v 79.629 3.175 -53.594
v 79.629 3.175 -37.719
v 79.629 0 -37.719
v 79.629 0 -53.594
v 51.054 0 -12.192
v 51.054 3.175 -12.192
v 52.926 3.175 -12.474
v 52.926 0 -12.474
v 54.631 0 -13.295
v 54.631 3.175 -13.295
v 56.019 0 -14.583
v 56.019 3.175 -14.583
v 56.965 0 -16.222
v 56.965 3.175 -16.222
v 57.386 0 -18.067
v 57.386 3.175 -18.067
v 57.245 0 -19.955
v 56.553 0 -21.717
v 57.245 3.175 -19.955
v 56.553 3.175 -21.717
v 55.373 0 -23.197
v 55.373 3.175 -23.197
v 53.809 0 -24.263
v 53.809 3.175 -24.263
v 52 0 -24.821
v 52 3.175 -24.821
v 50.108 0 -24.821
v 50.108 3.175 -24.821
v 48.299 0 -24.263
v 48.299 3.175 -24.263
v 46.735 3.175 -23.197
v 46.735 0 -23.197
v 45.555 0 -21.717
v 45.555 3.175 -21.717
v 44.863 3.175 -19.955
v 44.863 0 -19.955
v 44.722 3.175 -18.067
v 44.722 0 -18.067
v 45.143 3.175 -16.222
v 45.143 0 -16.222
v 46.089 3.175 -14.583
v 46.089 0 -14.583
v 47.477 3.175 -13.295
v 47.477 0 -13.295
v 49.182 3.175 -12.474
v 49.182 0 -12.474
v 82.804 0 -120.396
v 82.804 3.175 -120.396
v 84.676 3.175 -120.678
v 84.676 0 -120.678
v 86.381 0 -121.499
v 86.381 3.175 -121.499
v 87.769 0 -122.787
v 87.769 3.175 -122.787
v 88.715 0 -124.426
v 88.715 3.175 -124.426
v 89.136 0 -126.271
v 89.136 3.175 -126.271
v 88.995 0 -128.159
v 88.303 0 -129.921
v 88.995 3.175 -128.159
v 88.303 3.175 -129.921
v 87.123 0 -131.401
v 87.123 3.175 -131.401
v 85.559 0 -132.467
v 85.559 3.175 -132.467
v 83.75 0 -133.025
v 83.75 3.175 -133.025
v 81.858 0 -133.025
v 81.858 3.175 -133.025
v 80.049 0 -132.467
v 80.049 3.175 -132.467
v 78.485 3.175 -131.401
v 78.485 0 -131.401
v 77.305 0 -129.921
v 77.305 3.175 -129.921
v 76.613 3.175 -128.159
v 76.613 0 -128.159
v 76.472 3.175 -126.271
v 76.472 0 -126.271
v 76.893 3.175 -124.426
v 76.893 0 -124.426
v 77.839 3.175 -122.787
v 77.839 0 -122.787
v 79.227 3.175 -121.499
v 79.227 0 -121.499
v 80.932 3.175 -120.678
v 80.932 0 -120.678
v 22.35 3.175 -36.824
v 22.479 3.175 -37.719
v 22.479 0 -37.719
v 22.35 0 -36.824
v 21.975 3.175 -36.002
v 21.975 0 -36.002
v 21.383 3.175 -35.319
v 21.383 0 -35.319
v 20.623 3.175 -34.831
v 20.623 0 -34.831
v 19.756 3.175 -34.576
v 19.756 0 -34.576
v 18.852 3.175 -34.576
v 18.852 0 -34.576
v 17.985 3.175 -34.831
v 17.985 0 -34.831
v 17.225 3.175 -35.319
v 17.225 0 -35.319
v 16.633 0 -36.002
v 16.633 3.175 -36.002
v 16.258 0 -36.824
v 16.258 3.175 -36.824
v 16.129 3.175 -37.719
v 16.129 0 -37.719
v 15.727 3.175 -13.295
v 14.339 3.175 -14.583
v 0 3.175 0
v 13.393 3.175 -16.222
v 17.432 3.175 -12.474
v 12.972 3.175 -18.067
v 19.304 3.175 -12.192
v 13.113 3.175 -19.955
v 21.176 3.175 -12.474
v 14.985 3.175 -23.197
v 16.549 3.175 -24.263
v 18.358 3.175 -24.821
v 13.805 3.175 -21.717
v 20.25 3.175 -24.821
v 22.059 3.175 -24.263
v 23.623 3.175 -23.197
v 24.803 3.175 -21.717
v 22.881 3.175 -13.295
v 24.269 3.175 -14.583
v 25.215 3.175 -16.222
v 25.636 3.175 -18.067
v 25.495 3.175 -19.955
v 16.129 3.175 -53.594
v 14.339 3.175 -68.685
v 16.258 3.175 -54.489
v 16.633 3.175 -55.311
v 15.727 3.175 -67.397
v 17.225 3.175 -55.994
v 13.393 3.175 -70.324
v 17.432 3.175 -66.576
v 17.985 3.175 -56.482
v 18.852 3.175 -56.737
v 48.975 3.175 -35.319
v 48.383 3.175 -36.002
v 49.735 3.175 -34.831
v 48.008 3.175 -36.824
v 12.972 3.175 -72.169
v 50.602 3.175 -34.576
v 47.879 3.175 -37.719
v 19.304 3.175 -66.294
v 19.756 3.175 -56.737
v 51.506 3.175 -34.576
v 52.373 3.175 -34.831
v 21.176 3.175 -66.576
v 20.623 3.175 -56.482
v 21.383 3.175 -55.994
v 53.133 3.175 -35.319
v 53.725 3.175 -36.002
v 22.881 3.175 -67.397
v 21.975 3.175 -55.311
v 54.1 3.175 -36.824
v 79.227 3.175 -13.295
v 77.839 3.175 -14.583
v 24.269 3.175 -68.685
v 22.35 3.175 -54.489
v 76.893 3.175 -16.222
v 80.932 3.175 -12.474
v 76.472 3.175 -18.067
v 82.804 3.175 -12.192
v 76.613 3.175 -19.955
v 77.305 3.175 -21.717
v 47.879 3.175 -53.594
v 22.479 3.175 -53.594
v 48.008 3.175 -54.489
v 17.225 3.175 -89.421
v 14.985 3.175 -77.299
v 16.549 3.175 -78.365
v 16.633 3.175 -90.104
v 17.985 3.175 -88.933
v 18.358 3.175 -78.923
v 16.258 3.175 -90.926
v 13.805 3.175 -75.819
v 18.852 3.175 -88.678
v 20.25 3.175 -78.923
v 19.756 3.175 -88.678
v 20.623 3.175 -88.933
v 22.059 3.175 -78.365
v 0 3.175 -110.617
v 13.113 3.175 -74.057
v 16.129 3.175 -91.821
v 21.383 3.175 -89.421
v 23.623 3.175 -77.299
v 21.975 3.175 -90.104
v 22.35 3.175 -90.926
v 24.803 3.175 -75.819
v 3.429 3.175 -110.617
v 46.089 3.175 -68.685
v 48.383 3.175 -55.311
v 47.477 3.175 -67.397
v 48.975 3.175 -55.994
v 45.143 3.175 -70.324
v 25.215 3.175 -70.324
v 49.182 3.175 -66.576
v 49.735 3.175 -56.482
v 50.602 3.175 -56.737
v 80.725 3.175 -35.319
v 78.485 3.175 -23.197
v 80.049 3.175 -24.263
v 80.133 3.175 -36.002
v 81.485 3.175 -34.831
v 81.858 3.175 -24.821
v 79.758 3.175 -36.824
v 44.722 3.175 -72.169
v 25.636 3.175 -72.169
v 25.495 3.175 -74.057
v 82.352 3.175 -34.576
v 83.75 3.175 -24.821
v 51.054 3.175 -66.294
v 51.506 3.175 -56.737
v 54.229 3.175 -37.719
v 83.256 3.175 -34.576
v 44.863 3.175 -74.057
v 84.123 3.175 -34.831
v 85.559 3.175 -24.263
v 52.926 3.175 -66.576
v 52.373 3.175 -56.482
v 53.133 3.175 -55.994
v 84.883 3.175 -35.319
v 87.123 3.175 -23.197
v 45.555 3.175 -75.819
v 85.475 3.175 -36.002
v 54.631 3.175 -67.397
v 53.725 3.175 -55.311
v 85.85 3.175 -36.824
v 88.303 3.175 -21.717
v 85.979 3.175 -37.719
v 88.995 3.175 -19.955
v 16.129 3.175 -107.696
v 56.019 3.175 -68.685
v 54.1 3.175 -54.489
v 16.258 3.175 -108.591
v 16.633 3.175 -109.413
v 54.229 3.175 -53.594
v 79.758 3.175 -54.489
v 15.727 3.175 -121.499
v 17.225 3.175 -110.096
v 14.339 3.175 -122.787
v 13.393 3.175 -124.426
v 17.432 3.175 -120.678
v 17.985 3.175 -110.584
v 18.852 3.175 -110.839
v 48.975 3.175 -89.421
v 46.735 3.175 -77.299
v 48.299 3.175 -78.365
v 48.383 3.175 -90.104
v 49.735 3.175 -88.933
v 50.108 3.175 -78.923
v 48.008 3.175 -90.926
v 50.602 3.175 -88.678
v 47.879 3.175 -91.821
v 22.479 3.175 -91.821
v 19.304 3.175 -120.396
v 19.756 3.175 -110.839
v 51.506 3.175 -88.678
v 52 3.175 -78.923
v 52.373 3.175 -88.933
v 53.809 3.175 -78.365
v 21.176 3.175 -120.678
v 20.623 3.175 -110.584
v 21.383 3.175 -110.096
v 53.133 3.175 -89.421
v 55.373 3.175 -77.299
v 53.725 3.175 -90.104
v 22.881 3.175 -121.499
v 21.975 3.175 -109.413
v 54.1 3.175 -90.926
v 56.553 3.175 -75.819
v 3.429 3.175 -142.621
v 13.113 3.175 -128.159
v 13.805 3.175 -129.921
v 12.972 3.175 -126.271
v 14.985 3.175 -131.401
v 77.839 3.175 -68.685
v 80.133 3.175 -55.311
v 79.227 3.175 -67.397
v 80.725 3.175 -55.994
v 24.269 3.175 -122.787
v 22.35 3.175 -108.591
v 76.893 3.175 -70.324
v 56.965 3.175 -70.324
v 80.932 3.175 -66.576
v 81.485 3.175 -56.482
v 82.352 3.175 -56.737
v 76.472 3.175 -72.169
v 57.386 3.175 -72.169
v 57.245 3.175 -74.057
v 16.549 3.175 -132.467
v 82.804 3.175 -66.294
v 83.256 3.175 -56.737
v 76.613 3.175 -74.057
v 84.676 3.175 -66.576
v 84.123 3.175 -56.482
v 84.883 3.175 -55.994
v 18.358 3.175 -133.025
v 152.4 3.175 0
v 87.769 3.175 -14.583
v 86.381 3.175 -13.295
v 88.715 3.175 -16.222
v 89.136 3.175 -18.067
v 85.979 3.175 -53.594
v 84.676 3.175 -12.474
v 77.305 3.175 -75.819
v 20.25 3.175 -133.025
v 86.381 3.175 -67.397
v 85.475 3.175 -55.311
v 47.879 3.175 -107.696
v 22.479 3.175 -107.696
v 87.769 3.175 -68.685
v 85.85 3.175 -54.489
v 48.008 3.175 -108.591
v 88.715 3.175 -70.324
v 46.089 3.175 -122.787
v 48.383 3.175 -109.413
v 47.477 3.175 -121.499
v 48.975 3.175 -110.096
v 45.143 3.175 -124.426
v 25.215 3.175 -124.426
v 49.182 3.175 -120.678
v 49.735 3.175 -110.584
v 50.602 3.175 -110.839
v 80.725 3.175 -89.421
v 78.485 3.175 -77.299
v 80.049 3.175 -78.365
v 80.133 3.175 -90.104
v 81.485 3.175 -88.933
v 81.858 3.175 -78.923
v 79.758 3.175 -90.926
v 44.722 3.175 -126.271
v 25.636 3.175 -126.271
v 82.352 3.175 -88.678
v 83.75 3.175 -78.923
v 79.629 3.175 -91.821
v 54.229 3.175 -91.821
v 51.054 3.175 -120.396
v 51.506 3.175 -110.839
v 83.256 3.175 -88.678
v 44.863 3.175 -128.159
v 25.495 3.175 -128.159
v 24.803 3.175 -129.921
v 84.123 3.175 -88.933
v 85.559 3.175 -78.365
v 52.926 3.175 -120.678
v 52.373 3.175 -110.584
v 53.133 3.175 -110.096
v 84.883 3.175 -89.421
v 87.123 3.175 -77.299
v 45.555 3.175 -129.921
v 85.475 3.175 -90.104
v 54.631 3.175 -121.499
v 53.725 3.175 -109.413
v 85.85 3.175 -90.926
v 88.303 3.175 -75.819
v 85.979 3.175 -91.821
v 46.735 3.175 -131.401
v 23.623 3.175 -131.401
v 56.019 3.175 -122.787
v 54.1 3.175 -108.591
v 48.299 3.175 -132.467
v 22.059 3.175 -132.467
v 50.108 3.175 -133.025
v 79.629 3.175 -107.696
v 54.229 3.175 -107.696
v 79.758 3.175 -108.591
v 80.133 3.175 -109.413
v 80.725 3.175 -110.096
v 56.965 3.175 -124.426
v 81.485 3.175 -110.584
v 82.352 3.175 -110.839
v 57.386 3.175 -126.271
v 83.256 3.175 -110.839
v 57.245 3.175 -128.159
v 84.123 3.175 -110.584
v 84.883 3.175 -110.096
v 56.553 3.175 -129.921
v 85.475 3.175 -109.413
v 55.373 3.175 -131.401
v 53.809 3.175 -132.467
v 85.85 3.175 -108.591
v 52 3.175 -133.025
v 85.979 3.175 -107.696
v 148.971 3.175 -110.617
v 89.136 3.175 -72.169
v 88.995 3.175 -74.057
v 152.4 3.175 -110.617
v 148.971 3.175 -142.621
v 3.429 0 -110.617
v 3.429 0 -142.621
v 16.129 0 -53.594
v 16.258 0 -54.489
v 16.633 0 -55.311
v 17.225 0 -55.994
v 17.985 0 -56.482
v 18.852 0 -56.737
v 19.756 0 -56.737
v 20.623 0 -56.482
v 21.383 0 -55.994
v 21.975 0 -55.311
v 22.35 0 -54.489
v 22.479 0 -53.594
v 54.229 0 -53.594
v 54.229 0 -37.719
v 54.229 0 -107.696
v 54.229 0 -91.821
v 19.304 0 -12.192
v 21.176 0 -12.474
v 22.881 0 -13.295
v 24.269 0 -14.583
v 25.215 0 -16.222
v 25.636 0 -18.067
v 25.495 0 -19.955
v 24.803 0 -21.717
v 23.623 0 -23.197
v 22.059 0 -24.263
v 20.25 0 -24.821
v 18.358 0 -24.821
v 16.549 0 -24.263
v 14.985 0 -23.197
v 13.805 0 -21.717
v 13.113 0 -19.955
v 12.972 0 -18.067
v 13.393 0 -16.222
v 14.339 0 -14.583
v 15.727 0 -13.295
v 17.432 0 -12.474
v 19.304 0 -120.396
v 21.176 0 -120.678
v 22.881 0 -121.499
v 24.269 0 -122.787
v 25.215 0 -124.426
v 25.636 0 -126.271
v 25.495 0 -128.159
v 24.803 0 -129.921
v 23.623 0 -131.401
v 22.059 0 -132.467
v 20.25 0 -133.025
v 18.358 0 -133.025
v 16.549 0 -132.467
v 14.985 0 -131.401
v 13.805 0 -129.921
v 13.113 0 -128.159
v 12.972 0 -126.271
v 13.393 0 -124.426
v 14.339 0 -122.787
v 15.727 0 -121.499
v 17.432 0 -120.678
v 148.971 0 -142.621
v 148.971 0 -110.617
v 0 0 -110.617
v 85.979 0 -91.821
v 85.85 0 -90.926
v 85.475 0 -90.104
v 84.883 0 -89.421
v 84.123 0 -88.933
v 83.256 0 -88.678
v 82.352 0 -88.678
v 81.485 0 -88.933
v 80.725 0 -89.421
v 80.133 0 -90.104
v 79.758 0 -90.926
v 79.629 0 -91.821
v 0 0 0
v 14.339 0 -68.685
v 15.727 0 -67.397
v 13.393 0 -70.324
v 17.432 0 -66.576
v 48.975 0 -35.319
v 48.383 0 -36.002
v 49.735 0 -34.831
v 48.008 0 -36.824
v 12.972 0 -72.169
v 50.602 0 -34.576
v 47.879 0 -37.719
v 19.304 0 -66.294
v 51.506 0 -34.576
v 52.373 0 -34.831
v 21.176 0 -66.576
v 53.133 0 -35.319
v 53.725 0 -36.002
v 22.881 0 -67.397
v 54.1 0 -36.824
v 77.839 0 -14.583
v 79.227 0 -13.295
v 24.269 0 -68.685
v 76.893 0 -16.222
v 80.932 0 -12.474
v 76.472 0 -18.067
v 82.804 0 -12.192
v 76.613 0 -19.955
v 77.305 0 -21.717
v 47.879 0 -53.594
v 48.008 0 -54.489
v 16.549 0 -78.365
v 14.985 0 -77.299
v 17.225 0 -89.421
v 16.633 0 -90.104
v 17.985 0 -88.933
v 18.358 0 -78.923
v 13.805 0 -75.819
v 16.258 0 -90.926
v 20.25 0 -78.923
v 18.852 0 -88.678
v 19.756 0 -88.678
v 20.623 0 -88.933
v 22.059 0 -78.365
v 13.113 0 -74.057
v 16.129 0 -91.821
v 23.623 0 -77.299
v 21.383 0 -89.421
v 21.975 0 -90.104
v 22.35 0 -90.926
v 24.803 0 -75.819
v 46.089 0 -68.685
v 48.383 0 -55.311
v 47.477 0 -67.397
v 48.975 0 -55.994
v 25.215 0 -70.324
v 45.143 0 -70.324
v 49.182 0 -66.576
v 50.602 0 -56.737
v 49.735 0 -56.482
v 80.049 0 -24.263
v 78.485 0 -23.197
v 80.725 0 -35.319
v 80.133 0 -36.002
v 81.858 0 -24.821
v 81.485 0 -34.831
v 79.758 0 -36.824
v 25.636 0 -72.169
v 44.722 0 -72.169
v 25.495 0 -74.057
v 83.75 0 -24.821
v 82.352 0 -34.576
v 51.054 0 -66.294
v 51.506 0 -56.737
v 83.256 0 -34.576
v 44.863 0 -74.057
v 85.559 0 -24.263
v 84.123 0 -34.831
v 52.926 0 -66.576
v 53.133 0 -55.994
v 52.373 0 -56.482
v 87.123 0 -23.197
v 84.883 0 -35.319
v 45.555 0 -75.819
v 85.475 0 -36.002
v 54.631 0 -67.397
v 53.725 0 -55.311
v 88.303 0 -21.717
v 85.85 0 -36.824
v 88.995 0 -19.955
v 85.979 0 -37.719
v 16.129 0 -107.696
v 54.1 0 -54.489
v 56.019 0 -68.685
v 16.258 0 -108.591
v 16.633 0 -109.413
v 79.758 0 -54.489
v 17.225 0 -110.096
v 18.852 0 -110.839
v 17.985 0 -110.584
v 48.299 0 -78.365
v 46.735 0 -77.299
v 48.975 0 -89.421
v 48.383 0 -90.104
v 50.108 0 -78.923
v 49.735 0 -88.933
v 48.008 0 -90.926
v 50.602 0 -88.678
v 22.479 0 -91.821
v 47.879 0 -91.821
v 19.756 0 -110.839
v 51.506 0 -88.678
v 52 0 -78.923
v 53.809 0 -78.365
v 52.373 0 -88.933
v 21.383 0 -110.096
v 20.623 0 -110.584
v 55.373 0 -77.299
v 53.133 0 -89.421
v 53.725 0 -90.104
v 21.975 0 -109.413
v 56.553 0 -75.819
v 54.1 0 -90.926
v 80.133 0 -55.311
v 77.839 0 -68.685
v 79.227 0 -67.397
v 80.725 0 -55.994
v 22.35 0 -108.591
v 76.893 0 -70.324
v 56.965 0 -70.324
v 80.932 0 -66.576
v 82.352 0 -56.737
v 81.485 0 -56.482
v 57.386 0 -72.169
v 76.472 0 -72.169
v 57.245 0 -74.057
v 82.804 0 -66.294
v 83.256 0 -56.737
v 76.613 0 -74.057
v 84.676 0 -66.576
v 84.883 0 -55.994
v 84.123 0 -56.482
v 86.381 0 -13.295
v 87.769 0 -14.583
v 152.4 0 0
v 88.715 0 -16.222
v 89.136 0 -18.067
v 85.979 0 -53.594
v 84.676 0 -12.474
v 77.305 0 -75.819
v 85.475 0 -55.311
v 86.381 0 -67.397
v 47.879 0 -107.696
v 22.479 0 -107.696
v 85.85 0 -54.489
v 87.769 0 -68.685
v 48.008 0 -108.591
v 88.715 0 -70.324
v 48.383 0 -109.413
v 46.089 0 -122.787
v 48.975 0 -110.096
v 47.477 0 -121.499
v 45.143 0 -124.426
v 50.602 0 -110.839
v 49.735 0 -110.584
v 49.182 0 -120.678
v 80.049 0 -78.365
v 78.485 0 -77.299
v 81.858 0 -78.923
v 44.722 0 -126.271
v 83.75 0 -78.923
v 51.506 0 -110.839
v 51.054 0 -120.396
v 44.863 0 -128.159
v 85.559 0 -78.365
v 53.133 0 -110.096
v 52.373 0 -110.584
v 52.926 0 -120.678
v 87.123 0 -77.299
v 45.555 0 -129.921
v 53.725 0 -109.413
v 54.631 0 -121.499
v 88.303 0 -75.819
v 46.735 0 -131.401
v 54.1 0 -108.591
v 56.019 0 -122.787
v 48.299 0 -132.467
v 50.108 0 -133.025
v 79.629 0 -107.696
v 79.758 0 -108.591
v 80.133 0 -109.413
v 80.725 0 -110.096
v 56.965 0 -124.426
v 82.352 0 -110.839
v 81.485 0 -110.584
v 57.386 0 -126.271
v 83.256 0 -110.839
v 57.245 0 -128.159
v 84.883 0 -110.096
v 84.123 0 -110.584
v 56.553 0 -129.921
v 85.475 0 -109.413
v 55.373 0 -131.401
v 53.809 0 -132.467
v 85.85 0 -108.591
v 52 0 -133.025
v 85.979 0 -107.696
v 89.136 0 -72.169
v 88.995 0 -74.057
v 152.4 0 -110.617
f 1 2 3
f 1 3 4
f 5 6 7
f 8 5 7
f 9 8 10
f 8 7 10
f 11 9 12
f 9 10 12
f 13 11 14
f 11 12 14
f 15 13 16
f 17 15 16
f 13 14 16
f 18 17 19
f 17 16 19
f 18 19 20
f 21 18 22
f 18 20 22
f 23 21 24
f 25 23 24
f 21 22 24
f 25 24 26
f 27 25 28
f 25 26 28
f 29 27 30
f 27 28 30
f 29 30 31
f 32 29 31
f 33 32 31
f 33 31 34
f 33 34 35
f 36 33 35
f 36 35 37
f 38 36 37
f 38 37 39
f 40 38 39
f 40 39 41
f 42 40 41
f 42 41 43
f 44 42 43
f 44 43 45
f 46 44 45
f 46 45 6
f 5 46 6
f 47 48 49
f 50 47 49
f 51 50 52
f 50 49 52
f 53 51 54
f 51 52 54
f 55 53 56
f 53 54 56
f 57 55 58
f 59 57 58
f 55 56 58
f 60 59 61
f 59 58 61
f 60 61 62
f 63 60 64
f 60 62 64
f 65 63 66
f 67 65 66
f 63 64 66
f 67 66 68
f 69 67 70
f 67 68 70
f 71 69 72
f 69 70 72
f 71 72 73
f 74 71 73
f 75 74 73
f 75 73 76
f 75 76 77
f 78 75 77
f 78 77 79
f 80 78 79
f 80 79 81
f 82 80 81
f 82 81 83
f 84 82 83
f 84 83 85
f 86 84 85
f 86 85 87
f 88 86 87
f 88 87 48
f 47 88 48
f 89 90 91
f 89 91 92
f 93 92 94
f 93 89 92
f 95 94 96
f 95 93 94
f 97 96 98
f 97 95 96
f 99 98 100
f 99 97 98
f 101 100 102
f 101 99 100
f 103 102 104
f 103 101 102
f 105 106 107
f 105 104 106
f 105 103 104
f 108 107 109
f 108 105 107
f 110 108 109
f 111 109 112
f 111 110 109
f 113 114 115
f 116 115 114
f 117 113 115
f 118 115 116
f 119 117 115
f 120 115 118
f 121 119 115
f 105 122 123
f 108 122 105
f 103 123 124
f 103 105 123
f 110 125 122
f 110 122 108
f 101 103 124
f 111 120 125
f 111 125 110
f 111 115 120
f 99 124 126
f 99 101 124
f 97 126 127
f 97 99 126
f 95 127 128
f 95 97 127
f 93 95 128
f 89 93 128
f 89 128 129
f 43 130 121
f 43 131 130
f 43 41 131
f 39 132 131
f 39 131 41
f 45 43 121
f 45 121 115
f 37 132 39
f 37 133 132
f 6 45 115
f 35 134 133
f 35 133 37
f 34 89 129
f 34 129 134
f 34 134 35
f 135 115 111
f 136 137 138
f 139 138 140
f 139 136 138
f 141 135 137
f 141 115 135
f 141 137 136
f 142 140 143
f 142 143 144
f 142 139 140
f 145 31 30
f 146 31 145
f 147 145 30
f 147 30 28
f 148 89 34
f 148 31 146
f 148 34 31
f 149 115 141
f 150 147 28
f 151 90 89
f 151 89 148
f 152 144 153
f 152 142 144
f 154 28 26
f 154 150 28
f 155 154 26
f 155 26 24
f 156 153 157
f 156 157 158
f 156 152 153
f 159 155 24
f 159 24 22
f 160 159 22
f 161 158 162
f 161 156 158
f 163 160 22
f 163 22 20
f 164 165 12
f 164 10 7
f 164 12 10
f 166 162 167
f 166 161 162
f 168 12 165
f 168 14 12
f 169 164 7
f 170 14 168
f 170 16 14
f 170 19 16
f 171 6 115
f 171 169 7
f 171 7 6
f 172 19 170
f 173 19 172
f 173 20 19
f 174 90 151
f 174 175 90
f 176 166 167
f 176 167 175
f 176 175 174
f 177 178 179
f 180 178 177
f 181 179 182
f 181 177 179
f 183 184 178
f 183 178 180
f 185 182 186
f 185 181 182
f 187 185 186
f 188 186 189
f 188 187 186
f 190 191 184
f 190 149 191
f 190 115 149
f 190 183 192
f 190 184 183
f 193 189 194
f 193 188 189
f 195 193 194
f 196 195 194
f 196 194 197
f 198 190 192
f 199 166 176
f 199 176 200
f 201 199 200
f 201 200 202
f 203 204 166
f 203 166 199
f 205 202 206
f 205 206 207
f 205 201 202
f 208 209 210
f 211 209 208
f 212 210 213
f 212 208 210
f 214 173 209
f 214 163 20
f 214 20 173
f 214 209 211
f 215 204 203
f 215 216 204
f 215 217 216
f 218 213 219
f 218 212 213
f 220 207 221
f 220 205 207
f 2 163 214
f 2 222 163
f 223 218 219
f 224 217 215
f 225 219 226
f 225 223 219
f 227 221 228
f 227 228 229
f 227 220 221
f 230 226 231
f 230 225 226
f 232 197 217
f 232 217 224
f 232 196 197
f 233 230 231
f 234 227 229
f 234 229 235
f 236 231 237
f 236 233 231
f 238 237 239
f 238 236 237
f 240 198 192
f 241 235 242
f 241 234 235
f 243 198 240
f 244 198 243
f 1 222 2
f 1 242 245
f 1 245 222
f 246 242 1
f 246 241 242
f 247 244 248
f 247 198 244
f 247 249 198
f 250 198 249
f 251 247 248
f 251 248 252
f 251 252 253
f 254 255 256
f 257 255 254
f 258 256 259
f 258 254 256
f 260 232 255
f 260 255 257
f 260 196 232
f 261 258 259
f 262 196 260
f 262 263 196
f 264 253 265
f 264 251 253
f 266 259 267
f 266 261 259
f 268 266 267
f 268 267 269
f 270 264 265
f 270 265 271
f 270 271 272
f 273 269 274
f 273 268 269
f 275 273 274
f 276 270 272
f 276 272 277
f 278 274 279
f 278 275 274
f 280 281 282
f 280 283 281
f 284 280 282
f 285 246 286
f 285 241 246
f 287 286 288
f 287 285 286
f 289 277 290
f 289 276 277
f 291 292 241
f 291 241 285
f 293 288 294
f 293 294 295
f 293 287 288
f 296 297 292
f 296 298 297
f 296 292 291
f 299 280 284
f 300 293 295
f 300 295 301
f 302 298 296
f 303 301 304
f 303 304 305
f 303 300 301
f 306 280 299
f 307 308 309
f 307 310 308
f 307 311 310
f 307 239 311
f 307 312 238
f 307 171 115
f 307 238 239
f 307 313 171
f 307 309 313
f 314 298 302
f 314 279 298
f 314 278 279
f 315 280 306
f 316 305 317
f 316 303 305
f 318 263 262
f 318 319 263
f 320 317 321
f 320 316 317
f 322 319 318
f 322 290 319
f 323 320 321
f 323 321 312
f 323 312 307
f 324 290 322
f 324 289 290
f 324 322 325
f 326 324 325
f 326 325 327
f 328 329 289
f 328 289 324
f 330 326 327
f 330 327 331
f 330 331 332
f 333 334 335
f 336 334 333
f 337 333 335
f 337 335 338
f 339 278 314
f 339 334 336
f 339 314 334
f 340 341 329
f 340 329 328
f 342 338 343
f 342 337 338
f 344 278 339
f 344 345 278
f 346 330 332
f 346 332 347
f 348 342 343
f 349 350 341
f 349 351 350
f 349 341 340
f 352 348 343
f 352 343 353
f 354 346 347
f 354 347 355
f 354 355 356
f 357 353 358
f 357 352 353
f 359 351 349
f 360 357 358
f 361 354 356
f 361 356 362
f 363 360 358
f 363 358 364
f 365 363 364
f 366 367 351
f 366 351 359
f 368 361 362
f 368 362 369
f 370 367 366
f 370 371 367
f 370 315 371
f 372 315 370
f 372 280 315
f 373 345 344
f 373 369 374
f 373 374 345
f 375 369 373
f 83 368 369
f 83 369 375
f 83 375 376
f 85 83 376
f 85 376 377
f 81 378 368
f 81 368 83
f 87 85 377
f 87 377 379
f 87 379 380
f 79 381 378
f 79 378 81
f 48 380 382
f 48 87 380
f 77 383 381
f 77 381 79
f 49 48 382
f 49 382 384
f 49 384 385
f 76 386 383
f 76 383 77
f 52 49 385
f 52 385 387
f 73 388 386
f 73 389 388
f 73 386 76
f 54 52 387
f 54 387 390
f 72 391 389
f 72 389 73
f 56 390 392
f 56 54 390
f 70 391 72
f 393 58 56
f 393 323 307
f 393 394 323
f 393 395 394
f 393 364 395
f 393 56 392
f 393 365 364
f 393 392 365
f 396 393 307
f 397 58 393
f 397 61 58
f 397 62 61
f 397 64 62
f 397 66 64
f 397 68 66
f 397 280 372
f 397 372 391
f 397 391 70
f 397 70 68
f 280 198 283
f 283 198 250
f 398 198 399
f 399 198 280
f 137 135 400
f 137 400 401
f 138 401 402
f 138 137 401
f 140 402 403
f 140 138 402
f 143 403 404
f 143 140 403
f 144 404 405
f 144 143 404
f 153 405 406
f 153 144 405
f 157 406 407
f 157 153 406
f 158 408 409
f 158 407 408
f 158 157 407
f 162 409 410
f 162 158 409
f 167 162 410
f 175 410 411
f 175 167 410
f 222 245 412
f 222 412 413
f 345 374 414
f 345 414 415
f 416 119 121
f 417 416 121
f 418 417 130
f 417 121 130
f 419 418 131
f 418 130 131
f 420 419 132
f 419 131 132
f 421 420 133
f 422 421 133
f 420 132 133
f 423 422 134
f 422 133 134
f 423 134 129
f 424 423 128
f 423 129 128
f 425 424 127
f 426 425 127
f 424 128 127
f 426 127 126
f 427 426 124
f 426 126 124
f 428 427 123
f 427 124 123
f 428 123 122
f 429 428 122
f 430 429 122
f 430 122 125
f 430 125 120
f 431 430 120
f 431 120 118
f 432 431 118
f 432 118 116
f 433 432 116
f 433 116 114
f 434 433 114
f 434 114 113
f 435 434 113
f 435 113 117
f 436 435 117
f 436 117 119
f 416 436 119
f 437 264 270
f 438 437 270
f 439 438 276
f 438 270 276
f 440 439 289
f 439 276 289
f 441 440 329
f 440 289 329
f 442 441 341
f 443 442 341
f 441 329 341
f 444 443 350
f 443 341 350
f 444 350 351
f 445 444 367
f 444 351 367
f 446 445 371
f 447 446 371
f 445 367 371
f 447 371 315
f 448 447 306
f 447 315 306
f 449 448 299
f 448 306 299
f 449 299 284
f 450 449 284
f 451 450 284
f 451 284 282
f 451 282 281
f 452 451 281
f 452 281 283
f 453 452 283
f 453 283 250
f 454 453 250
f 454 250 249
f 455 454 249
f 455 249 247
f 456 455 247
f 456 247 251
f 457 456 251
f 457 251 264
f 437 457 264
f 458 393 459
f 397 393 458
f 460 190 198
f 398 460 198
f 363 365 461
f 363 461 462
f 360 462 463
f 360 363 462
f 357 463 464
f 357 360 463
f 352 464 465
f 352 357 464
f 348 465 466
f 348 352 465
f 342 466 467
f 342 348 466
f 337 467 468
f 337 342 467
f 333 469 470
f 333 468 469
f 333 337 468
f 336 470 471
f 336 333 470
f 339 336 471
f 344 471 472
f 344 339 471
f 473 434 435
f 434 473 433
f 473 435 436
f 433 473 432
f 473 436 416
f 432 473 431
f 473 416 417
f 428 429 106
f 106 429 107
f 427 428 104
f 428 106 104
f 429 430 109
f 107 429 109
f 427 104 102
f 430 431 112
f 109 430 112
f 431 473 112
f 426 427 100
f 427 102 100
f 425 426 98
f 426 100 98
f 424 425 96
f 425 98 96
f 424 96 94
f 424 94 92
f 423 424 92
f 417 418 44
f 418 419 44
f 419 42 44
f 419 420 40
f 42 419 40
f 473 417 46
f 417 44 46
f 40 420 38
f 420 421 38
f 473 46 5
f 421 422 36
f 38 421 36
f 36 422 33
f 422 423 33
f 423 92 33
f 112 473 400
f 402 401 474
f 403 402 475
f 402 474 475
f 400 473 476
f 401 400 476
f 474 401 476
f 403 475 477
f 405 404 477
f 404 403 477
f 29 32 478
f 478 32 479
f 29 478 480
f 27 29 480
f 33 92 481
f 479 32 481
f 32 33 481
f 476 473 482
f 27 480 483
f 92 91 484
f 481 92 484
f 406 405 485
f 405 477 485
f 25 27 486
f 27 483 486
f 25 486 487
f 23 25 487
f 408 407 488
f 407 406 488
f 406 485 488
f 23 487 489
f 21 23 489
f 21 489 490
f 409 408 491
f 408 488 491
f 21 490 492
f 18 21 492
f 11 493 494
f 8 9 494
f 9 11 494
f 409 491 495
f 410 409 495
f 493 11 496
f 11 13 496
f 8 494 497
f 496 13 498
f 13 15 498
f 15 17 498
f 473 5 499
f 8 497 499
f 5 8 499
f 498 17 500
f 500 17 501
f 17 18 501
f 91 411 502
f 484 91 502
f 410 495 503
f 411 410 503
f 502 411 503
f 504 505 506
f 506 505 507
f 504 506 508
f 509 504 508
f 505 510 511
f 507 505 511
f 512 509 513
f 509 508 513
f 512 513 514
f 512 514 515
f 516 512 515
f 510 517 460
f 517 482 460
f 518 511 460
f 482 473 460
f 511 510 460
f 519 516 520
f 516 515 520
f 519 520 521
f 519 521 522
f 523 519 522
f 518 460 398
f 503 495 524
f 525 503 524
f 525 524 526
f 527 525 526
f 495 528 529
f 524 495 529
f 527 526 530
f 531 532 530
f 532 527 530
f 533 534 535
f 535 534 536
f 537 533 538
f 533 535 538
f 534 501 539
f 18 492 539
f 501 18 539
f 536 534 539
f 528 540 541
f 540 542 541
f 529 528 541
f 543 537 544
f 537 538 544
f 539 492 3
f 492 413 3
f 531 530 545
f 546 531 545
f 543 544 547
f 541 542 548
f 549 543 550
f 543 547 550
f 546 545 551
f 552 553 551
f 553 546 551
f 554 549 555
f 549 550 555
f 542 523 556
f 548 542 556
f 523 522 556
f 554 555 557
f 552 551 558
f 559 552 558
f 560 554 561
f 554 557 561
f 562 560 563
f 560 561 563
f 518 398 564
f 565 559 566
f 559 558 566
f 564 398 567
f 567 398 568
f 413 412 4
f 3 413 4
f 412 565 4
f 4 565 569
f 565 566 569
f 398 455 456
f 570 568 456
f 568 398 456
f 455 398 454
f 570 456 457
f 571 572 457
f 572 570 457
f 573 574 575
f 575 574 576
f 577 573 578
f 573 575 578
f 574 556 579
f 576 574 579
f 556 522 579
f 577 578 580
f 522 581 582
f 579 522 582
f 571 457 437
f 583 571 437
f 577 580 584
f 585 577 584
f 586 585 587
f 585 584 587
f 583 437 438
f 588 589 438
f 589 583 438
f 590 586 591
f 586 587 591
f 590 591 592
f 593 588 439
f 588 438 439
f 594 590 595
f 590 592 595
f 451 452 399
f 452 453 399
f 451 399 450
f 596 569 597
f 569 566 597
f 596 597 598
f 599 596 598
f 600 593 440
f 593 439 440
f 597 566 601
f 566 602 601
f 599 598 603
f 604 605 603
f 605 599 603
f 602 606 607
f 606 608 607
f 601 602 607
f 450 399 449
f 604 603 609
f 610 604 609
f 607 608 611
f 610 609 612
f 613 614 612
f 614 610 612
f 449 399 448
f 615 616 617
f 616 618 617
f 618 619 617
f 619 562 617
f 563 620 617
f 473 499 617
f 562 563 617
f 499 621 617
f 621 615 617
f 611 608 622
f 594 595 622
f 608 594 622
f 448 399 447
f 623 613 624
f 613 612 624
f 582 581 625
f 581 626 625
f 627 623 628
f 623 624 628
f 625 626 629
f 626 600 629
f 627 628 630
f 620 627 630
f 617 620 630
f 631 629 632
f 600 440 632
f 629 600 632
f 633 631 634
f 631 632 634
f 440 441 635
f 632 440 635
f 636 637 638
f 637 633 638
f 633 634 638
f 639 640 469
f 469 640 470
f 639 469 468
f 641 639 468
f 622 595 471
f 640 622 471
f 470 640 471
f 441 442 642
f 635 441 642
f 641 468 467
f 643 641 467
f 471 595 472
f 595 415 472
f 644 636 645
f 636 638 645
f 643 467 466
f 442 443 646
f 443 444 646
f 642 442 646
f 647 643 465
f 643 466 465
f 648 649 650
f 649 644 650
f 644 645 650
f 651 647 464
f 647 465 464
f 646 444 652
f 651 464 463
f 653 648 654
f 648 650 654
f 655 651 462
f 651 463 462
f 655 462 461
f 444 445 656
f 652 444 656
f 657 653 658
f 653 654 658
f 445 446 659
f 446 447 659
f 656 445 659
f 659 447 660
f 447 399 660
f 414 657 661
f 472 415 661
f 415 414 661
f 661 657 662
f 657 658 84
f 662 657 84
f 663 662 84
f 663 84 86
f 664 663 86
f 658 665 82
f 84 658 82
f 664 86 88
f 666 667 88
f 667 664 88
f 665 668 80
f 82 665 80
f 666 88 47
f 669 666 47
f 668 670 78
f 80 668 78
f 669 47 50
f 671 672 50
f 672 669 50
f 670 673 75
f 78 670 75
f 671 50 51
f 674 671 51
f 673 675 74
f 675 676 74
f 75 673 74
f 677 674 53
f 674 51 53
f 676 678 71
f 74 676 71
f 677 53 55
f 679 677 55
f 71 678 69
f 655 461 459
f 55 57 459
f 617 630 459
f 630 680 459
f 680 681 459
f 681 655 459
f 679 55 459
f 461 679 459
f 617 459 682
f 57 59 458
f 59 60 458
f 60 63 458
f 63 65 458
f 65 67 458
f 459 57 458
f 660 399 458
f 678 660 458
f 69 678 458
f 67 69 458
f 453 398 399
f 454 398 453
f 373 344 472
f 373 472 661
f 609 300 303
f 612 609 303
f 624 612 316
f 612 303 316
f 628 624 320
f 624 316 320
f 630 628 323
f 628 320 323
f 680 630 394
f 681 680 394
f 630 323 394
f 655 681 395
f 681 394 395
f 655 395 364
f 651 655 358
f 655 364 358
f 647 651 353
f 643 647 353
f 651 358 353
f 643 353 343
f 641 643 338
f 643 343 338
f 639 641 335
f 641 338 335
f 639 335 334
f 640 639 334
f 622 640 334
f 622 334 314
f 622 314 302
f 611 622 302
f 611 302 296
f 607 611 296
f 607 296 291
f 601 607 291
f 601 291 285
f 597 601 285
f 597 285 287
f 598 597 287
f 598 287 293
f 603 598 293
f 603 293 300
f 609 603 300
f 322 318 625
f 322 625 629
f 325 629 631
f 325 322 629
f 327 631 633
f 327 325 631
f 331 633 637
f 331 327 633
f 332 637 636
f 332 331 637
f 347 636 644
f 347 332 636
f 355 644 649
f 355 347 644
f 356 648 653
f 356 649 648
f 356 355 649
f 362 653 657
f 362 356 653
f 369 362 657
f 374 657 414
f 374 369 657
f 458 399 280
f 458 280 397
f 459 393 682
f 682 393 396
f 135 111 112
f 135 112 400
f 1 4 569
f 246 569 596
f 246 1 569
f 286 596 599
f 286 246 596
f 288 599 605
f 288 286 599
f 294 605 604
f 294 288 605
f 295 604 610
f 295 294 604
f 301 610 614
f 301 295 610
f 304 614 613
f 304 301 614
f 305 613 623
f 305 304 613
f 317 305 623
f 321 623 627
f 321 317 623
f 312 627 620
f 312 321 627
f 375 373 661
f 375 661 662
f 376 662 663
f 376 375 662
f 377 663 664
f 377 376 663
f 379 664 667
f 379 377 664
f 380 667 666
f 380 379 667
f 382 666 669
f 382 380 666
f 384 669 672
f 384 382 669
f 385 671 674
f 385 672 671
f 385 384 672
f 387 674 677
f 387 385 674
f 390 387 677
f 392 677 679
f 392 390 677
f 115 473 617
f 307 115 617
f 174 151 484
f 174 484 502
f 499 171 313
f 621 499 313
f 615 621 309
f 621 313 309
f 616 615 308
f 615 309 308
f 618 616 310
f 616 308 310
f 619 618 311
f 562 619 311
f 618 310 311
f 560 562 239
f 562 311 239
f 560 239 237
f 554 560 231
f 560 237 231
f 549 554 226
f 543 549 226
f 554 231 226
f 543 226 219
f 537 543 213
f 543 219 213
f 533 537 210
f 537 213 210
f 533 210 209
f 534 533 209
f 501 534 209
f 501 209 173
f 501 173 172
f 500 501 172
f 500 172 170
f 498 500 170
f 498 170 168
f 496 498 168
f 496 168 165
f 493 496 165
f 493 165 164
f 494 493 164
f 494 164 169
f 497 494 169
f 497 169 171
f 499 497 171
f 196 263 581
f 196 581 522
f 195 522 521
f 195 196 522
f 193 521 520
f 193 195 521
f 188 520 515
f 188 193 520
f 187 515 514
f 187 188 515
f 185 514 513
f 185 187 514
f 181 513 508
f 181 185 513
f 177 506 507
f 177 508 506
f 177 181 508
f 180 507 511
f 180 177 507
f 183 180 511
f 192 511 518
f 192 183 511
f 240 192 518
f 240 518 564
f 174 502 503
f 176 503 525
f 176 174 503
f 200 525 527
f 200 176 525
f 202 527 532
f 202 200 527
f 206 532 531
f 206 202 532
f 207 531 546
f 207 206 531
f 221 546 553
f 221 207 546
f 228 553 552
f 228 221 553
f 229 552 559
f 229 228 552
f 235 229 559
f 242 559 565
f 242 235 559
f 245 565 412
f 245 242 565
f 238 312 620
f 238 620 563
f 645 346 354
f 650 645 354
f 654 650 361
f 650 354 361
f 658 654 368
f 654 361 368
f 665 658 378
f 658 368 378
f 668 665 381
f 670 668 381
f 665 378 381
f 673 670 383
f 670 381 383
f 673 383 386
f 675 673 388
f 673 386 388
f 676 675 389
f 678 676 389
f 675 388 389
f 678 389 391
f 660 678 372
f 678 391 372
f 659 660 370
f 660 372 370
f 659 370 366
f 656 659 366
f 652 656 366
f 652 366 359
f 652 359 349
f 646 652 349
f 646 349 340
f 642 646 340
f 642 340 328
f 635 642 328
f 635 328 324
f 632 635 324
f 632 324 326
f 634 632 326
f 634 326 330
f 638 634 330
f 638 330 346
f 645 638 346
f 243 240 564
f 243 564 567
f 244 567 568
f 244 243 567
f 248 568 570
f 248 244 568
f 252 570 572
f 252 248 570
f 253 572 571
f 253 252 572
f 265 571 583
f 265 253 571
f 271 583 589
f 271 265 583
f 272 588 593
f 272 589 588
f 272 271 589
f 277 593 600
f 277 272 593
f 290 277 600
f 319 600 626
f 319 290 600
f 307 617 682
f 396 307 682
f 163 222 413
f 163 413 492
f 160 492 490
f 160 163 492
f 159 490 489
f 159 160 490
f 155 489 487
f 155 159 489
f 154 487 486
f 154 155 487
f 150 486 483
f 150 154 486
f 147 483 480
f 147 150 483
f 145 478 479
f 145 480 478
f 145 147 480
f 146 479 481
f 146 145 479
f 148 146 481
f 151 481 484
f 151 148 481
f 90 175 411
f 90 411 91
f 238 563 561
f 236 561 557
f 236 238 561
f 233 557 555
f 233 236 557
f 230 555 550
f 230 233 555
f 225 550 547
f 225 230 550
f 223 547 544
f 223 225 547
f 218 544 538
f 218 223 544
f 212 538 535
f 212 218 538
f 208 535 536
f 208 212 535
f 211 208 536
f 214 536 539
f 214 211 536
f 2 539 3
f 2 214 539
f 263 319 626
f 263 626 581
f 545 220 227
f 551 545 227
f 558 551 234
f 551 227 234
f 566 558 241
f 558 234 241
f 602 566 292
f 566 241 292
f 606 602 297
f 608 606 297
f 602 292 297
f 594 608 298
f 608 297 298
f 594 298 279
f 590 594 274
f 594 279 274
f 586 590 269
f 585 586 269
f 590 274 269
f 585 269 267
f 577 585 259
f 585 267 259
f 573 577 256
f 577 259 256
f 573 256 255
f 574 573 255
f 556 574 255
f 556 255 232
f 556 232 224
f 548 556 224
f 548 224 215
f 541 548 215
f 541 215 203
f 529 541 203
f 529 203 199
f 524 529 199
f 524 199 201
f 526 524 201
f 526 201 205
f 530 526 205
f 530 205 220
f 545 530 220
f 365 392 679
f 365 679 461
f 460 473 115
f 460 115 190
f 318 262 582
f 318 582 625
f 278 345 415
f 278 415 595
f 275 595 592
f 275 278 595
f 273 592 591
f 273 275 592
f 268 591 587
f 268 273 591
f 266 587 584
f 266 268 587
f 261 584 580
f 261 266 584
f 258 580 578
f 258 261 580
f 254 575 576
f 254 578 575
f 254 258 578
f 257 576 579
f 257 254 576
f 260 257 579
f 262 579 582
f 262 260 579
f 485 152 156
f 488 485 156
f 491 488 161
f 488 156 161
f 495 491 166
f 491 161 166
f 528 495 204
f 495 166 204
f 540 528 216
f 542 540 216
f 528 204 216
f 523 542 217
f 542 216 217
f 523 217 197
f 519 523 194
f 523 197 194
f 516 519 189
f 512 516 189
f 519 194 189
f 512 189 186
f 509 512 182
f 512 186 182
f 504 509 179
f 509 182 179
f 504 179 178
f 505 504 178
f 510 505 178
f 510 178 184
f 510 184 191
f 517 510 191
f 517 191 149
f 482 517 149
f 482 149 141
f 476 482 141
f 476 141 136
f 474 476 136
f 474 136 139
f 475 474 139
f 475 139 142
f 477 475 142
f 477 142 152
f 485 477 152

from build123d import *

# Parameters (mm, degrees)
SKETCH1_W           = 152.4
SKETCH1_H           = 142.621
BOSS_EXTRUDE1_DEPTH = 3.175
SKETCH2_W           = 3.429
SKETCH2_H           = 32.004
CUT_EXTRUDE1_DEPTH  = 209.750066505
CUT_EXTRUDE2_REACH  = 210.75
SKETCH3_R           = 6.35


with BuildPart() as part:
    # Sketch1 → Boss-Extrude1 (new body)
    with BuildSketch(Plane(origin=(0, 0, 0), x_dir=(1, 0, 0), z_dir=(0, 1, 0))):
        with Locations((76.2, 71.3105)):
            Rectangle(SKETCH1_W, SKETCH1_H)
    extrude(amount=BOSS_EXTRUDE1_DEPTH)

    # Sketch2 → Cut-Extrude1 (cut, through all)
    with BuildSketch(Plane(origin=(0, 3.175, 0), x_dir=(1, 0, 0), z_dir=(0, 1, 0))):
        with Locations((1.7145, 126.619)):
            Rectangle(SKETCH2_W, SKETCH2_H)
        with Locations((150.6855, 126.619)):
            Rectangle(SKETCH2_W, SKETCH2_H)
    extrude(amount=-CUT_EXTRUDE1_DEPTH, mode=Mode.SUBTRACT)

    # Sketch3 → Cut-Extrude2 (cut, up to next)
    with BuildSketch(Plane(origin=(0, 3.175, 0), x_dir=(1, 0, 0), z_dir=(0, 1, 0)), mode=Mode.PRIVATE) as cut_extrude2_sk1:
        with Locations(Location((19.304, 126.746, 0), (0, 0, 270))):
            Circle(SKETCH3_R)
    cut_extrude2_tool1 = extrude(cut_extrude2_sk1.sketch, amount=-CUT_EXTRUDE2_REACH, mode=Mode.PRIVATE) & part.part
    # Sketch3 → Cut-Extrude2 (cut, up to next)
    with BuildSketch(Plane(origin=(0, 3.175, 0), x_dir=(1, 0, 0), z_dir=(0, 1, 0)), mode=Mode.PRIVATE) as cut_extrude2_sk2:
        with Locations(Location((51.054, 126.746, 0), (0, 0, 270))):
            Circle(SKETCH3_R)
    cut_extrude2_tool2 = extrude(cut_extrude2_sk2.sketch, amount=-CUT_EXTRUDE2_REACH, mode=Mode.PRIVATE) & part.part
    # Sketch3 → Cut-Extrude2 (cut, up to next)
    with BuildSketch(Plane(origin=(0, 3.175, 0), x_dir=(1, 0, 0), z_dir=(0, 1, 0)), mode=Mode.PRIVATE) as cut_extrude2_sk3:
        with Locations(Location((82.804, 126.746, 0), (0, 0, 270))):
            Circle(SKETCH3_R)
    cut_extrude2_tool3 = extrude(cut_extrude2_sk3.sketch, amount=-CUT_EXTRUDE2_REACH, mode=Mode.PRIVATE) & part.part
    # Sketch3 → Cut-Extrude2 (cut, up to next)
    with BuildSketch(Plane(origin=(0, 3.175, 0), x_dir=(1, 0, 0), z_dir=(0, 1, 0)), mode=Mode.PRIVATE) as cut_extrude2_sk4:
        with Locations(Location((19.304, 72.644, 0), (0, 0, 270))):
            Circle(SKETCH3_R)
    cut_extrude2_tool4 = extrude(cut_extrude2_sk4.sketch, amount=-CUT_EXTRUDE2_REACH, mode=Mode.PRIVATE) & part.part
    # Sketch3 → Cut-Extrude2 (cut, up to next)
    with BuildSketch(Plane(origin=(0, 3.175, 0), x_dir=(1, 0, 0), z_dir=(0, 1, 0)), mode=Mode.PRIVATE) as cut_extrude2_sk5:
        with Locations(Location((51.054, 72.644, 0), (0, 0, 270))):
            Circle(SKETCH3_R)
    cut_extrude2_tool5 = extrude(cut_extrude2_sk5.sketch, amount=-CUT_EXTRUDE2_REACH, mode=Mode.PRIVATE) & part.part
    # Sketch3 → Cut-Extrude2 (cut, up to next)
    with BuildSketch(Plane(origin=(0, 3.175, 0), x_dir=(1, 0, 0), z_dir=(0, 1, 0)), mode=Mode.PRIVATE) as cut_extrude2_sk6:
        with Locations(Location((82.804, 72.644, 0), (0, 0, 270))):
            Circle(SKETCH3_R)
    cut_extrude2_tool6 = extrude(cut_extrude2_sk6.sketch, amount=-CUT_EXTRUDE2_REACH, mode=Mode.PRIVATE) & part.part
    # Sketch3 → Cut-Extrude2 (cut, up to next)
    with BuildSketch(Plane(origin=(0, 3.175, 0), x_dir=(1, 0, 0), z_dir=(0, 1, 0)), mode=Mode.PRIVATE) as cut_extrude2_sk7:
        with Locations(Location((19.304, 18.542, 0), (0, 0, 270))):
            Circle(SKETCH3_R)
    cut_extrude2_tool7 = extrude(cut_extrude2_sk7.sketch, amount=-CUT_EXTRUDE2_REACH, mode=Mode.PRIVATE) & part.part
    # Sketch3 → Cut-Extrude2 (cut, up to next)
    with BuildSketch(Plane(origin=(0, 3.175, 0), x_dir=(1, 0, 0), z_dir=(0, 1, 0)), mode=Mode.PRIVATE) as cut_extrude2_sk8:
        with Locations(Location((51.054, 18.542, 0), (0, 0, 270))):
            Circle(SKETCH3_R)
    cut_extrude2_tool8 = extrude(cut_extrude2_sk8.sketch, amount=-CUT_EXTRUDE2_REACH, mode=Mode.PRIVATE) & part.part
    # Sketch3 → Cut-Extrude2 (cut, up to next)
    with BuildSketch(Plane(origin=(0, 3.175, 0), x_dir=(1, 0, 0), z_dir=(0, 1, 0)), mode=Mode.PRIVATE) as cut_extrude2_sk9:
        with Locations(Location((82.804, 18.542, 0), (0, 0, 270))):
            Circle(SKETCH3_R)
    cut_extrude2_tool9 = extrude(cut_extrude2_sk9.sketch, amount=-CUT_EXTRUDE2_REACH, mode=Mode.PRIVATE) & part.part
    # Sketch3 → Cut-Extrude2 (cut, up to next)
    with BuildSketch(Plane(origin=(0, 3.175, 0), x_dir=(1, 0, 0), z_dir=(0, 1, 0)), mode=Mode.PRIVATE) as cut_extrude2_sk10:
        with BuildLine():
            Line((22.479, 107.696), (22.479, 91.821))
            ThreePointArc((22.479, 91.821), (19.304, 88.646), (16.129, 91.821))
            Line((16.129, 91.821), (16.129, 107.696))
            ThreePointArc((16.129, 107.696), (19.304, 110.871), (22.479, 107.696))
        make_face()
    cut_extrude2_tool10 = extrude(cut_extrude2_sk10.sketch, amount=-CUT_EXTRUDE2_REACH, mode=Mode.PRIVATE) & part.part
    # Sketch3 → Cut-Extrude2 (cut, up to next)
    with BuildSketch(Plane(origin=(0, 3.175, 0), x_dir=(1, 0, 0), z_dir=(0, 1, 0)), mode=Mode.PRIVATE) as cut_extrude2_sk11:
        with BuildLine():
            Line((54.229, 107.696), (54.229, 91.821))
            ThreePointArc((54.229, 91.821), (51.054, 88.646), (47.879, 91.821))
            Line((47.879, 91.821), (47.879, 107.696))
            ThreePointArc((47.879, 107.696), (51.054, 110.871), (54.229, 107.696))
        make_face()
    cut_extrude2_tool11 = extrude(cut_extrude2_sk11.sketch, amount=-CUT_EXTRUDE2_REACH, mode=Mode.PRIVATE) & part.part
    # Sketch3 → Cut-Extrude2 (cut, up to next)
    with BuildSketch(Plane(origin=(0, 3.175, 0), x_dir=(1, 0, 0), z_dir=(0, 1, 0)), mode=Mode.PRIVATE) as cut_extrude2_sk12:
        with BuildLine():
            Line((85.979, 107.696), (85.979, 91.821))
            ThreePointArc((85.979, 91.821), (82.804, 88.646), (79.629, 91.821))
            Line((79.629, 91.821), (79.629, 107.696))
            ThreePointArc((79.629, 107.696), (82.804, 110.871), (85.979, 107.696))
        make_face()
    cut_extrude2_tool12 = extrude(cut_extrude2_sk12.sketch, amount=-CUT_EXTRUDE2_REACH, mode=Mode.PRIVATE) & part.part
    # Sketch3 → Cut-Extrude2 (cut, up to next)
    with BuildSketch(Plane(origin=(0, 3.175, 0), x_dir=(1, 0, 0), z_dir=(0, 1, 0)), mode=Mode.PRIVATE) as cut_extrude2_sk13:
        with BuildLine():
            Line((22.479, 53.594), (22.479, 37.719))
            ThreePointArc((22.479, 37.719), (19.304, 34.544), (16.129, 37.719))
            Line((16.129, 37.719), (16.129, 53.594))
            ThreePointArc((16.129, 53.594), (19.304, 56.769), (22.479, 53.594))
        make_face()
    cut_extrude2_tool13 = extrude(cut_extrude2_sk13.sketch, amount=-CUT_EXTRUDE2_REACH, mode=Mode.PRIVATE) & part.part
    # Sketch3 → Cut-Extrude2 (cut, up to next)
    with BuildSketch(Plane(origin=(0, 3.175, 0), x_dir=(1, 0, 0), z_dir=(0, 1, 0)), mode=Mode.PRIVATE) as cut_extrude2_sk14:
        with BuildLine():
            Line((54.229, 53.594), (54.229, 37.719))
            ThreePointArc((54.229, 37.719), (51.054, 34.544), (47.879, 37.719))
            Line((47.879, 37.719), (47.879, 53.594))
            ThreePointArc((47.879, 53.594), (51.054, 56.769), (54.229, 53.594))
        make_face()
    cut_extrude2_tool14 = extrude(cut_extrude2_sk14.sketch, amount=-CUT_EXTRUDE2_REACH, mode=Mode.PRIVATE) & part.part
    # Sketch3 → Cut-Extrude2 (cut, up to next)
    with BuildSketch(Plane(origin=(0, 3.175, 0), x_dir=(1, 0, 0), z_dir=(0, 1, 0)), mode=Mode.PRIVATE) as cut_extrude2_sk15:
        with BuildLine():
            Line((85.979, 53.594), (85.979, 37.719))
            ThreePointArc((85.979, 37.719), (82.804, 34.544), (79.629, 37.719))
            Line((79.629, 37.719), (79.629, 53.594))
            ThreePointArc((79.629, 53.594), (82.804, 56.769), (85.979, 53.594))
        make_face()
    cut_extrude2_tool15 = extrude(cut_extrude2_sk15.sketch, amount=-CUT_EXTRUDE2_REACH, mode=Mode.PRIVATE) & part.part
    add(cut_extrude2_tool1.solids().sort_by_distance((19.304, 3.175, -126.746))[0], mode=Mode.SUBTRACT)
    add(cut_extrude2_tool2.solids().sort_by_distance((51.054, 3.175, -126.746))[0], mode=Mode.SUBTRACT)
    add(cut_extrude2_tool3.solids().sort_by_distance((82.804, 3.175, -126.746))[0], mode=Mode.SUBTRACT)
    add(cut_extrude2_tool4.solids().sort_by_distance((19.304, 3.175, -72.644))[0], mode=Mode.SUBTRACT)
    add(cut_extrude2_tool5.solids().sort_by_distance((51.054, 3.175, -72.644))[0], mode=Mode.SUBTRACT)
    add(cut_extrude2_tool6.solids().sort_by_distance((82.804, 3.175, -72.644))[0], mode=Mode.SUBTRACT)
    add(cut_extrude2_tool7.solids().sort_by_distance((19.304, 3.175, -18.542))[0], mode=Mode.SUBTRACT)
    add(cut_extrude2_tool8.solids().sort_by_distance((51.054, 3.175, -18.542))[0], mode=Mode.SUBTRACT)
    add(cut_extrude2_tool9.solids().sort_by_distance((82.804, 3.175, -18.542))[0], mode=Mode.SUBTRACT)
    add(cut_extrude2_tool10.solids().sort_by_distance((19.304, 3.175, -99.7585))[0], mode=Mode.SUBTRACT)
    add(cut_extrude2_tool11.solids().sort_by_distance((51.054, 3.175, -99.7585))[0], mode=Mode.SUBTRACT)
    add(cut_extrude2_tool12.solids().sort_by_distance((82.804, 3.175, -99.7585))[0], mode=Mode.SUBTRACT)
    add(cut_extrude2_tool13.solids().sort_by_distance((19.304, 3.175, -45.6565))[0], mode=Mode.SUBTRACT)
    add(cut_extrude2_tool14.solids().sort_by_distance((51.054, 3.175, -45.6565))[0], mode=Mode.SUBTRACT)
    add(cut_extrude2_tool15.solids().sort_by_distance((82.804, 3.175, -45.6565))[0], mode=Mode.SUBTRACT)


solid = part.part
